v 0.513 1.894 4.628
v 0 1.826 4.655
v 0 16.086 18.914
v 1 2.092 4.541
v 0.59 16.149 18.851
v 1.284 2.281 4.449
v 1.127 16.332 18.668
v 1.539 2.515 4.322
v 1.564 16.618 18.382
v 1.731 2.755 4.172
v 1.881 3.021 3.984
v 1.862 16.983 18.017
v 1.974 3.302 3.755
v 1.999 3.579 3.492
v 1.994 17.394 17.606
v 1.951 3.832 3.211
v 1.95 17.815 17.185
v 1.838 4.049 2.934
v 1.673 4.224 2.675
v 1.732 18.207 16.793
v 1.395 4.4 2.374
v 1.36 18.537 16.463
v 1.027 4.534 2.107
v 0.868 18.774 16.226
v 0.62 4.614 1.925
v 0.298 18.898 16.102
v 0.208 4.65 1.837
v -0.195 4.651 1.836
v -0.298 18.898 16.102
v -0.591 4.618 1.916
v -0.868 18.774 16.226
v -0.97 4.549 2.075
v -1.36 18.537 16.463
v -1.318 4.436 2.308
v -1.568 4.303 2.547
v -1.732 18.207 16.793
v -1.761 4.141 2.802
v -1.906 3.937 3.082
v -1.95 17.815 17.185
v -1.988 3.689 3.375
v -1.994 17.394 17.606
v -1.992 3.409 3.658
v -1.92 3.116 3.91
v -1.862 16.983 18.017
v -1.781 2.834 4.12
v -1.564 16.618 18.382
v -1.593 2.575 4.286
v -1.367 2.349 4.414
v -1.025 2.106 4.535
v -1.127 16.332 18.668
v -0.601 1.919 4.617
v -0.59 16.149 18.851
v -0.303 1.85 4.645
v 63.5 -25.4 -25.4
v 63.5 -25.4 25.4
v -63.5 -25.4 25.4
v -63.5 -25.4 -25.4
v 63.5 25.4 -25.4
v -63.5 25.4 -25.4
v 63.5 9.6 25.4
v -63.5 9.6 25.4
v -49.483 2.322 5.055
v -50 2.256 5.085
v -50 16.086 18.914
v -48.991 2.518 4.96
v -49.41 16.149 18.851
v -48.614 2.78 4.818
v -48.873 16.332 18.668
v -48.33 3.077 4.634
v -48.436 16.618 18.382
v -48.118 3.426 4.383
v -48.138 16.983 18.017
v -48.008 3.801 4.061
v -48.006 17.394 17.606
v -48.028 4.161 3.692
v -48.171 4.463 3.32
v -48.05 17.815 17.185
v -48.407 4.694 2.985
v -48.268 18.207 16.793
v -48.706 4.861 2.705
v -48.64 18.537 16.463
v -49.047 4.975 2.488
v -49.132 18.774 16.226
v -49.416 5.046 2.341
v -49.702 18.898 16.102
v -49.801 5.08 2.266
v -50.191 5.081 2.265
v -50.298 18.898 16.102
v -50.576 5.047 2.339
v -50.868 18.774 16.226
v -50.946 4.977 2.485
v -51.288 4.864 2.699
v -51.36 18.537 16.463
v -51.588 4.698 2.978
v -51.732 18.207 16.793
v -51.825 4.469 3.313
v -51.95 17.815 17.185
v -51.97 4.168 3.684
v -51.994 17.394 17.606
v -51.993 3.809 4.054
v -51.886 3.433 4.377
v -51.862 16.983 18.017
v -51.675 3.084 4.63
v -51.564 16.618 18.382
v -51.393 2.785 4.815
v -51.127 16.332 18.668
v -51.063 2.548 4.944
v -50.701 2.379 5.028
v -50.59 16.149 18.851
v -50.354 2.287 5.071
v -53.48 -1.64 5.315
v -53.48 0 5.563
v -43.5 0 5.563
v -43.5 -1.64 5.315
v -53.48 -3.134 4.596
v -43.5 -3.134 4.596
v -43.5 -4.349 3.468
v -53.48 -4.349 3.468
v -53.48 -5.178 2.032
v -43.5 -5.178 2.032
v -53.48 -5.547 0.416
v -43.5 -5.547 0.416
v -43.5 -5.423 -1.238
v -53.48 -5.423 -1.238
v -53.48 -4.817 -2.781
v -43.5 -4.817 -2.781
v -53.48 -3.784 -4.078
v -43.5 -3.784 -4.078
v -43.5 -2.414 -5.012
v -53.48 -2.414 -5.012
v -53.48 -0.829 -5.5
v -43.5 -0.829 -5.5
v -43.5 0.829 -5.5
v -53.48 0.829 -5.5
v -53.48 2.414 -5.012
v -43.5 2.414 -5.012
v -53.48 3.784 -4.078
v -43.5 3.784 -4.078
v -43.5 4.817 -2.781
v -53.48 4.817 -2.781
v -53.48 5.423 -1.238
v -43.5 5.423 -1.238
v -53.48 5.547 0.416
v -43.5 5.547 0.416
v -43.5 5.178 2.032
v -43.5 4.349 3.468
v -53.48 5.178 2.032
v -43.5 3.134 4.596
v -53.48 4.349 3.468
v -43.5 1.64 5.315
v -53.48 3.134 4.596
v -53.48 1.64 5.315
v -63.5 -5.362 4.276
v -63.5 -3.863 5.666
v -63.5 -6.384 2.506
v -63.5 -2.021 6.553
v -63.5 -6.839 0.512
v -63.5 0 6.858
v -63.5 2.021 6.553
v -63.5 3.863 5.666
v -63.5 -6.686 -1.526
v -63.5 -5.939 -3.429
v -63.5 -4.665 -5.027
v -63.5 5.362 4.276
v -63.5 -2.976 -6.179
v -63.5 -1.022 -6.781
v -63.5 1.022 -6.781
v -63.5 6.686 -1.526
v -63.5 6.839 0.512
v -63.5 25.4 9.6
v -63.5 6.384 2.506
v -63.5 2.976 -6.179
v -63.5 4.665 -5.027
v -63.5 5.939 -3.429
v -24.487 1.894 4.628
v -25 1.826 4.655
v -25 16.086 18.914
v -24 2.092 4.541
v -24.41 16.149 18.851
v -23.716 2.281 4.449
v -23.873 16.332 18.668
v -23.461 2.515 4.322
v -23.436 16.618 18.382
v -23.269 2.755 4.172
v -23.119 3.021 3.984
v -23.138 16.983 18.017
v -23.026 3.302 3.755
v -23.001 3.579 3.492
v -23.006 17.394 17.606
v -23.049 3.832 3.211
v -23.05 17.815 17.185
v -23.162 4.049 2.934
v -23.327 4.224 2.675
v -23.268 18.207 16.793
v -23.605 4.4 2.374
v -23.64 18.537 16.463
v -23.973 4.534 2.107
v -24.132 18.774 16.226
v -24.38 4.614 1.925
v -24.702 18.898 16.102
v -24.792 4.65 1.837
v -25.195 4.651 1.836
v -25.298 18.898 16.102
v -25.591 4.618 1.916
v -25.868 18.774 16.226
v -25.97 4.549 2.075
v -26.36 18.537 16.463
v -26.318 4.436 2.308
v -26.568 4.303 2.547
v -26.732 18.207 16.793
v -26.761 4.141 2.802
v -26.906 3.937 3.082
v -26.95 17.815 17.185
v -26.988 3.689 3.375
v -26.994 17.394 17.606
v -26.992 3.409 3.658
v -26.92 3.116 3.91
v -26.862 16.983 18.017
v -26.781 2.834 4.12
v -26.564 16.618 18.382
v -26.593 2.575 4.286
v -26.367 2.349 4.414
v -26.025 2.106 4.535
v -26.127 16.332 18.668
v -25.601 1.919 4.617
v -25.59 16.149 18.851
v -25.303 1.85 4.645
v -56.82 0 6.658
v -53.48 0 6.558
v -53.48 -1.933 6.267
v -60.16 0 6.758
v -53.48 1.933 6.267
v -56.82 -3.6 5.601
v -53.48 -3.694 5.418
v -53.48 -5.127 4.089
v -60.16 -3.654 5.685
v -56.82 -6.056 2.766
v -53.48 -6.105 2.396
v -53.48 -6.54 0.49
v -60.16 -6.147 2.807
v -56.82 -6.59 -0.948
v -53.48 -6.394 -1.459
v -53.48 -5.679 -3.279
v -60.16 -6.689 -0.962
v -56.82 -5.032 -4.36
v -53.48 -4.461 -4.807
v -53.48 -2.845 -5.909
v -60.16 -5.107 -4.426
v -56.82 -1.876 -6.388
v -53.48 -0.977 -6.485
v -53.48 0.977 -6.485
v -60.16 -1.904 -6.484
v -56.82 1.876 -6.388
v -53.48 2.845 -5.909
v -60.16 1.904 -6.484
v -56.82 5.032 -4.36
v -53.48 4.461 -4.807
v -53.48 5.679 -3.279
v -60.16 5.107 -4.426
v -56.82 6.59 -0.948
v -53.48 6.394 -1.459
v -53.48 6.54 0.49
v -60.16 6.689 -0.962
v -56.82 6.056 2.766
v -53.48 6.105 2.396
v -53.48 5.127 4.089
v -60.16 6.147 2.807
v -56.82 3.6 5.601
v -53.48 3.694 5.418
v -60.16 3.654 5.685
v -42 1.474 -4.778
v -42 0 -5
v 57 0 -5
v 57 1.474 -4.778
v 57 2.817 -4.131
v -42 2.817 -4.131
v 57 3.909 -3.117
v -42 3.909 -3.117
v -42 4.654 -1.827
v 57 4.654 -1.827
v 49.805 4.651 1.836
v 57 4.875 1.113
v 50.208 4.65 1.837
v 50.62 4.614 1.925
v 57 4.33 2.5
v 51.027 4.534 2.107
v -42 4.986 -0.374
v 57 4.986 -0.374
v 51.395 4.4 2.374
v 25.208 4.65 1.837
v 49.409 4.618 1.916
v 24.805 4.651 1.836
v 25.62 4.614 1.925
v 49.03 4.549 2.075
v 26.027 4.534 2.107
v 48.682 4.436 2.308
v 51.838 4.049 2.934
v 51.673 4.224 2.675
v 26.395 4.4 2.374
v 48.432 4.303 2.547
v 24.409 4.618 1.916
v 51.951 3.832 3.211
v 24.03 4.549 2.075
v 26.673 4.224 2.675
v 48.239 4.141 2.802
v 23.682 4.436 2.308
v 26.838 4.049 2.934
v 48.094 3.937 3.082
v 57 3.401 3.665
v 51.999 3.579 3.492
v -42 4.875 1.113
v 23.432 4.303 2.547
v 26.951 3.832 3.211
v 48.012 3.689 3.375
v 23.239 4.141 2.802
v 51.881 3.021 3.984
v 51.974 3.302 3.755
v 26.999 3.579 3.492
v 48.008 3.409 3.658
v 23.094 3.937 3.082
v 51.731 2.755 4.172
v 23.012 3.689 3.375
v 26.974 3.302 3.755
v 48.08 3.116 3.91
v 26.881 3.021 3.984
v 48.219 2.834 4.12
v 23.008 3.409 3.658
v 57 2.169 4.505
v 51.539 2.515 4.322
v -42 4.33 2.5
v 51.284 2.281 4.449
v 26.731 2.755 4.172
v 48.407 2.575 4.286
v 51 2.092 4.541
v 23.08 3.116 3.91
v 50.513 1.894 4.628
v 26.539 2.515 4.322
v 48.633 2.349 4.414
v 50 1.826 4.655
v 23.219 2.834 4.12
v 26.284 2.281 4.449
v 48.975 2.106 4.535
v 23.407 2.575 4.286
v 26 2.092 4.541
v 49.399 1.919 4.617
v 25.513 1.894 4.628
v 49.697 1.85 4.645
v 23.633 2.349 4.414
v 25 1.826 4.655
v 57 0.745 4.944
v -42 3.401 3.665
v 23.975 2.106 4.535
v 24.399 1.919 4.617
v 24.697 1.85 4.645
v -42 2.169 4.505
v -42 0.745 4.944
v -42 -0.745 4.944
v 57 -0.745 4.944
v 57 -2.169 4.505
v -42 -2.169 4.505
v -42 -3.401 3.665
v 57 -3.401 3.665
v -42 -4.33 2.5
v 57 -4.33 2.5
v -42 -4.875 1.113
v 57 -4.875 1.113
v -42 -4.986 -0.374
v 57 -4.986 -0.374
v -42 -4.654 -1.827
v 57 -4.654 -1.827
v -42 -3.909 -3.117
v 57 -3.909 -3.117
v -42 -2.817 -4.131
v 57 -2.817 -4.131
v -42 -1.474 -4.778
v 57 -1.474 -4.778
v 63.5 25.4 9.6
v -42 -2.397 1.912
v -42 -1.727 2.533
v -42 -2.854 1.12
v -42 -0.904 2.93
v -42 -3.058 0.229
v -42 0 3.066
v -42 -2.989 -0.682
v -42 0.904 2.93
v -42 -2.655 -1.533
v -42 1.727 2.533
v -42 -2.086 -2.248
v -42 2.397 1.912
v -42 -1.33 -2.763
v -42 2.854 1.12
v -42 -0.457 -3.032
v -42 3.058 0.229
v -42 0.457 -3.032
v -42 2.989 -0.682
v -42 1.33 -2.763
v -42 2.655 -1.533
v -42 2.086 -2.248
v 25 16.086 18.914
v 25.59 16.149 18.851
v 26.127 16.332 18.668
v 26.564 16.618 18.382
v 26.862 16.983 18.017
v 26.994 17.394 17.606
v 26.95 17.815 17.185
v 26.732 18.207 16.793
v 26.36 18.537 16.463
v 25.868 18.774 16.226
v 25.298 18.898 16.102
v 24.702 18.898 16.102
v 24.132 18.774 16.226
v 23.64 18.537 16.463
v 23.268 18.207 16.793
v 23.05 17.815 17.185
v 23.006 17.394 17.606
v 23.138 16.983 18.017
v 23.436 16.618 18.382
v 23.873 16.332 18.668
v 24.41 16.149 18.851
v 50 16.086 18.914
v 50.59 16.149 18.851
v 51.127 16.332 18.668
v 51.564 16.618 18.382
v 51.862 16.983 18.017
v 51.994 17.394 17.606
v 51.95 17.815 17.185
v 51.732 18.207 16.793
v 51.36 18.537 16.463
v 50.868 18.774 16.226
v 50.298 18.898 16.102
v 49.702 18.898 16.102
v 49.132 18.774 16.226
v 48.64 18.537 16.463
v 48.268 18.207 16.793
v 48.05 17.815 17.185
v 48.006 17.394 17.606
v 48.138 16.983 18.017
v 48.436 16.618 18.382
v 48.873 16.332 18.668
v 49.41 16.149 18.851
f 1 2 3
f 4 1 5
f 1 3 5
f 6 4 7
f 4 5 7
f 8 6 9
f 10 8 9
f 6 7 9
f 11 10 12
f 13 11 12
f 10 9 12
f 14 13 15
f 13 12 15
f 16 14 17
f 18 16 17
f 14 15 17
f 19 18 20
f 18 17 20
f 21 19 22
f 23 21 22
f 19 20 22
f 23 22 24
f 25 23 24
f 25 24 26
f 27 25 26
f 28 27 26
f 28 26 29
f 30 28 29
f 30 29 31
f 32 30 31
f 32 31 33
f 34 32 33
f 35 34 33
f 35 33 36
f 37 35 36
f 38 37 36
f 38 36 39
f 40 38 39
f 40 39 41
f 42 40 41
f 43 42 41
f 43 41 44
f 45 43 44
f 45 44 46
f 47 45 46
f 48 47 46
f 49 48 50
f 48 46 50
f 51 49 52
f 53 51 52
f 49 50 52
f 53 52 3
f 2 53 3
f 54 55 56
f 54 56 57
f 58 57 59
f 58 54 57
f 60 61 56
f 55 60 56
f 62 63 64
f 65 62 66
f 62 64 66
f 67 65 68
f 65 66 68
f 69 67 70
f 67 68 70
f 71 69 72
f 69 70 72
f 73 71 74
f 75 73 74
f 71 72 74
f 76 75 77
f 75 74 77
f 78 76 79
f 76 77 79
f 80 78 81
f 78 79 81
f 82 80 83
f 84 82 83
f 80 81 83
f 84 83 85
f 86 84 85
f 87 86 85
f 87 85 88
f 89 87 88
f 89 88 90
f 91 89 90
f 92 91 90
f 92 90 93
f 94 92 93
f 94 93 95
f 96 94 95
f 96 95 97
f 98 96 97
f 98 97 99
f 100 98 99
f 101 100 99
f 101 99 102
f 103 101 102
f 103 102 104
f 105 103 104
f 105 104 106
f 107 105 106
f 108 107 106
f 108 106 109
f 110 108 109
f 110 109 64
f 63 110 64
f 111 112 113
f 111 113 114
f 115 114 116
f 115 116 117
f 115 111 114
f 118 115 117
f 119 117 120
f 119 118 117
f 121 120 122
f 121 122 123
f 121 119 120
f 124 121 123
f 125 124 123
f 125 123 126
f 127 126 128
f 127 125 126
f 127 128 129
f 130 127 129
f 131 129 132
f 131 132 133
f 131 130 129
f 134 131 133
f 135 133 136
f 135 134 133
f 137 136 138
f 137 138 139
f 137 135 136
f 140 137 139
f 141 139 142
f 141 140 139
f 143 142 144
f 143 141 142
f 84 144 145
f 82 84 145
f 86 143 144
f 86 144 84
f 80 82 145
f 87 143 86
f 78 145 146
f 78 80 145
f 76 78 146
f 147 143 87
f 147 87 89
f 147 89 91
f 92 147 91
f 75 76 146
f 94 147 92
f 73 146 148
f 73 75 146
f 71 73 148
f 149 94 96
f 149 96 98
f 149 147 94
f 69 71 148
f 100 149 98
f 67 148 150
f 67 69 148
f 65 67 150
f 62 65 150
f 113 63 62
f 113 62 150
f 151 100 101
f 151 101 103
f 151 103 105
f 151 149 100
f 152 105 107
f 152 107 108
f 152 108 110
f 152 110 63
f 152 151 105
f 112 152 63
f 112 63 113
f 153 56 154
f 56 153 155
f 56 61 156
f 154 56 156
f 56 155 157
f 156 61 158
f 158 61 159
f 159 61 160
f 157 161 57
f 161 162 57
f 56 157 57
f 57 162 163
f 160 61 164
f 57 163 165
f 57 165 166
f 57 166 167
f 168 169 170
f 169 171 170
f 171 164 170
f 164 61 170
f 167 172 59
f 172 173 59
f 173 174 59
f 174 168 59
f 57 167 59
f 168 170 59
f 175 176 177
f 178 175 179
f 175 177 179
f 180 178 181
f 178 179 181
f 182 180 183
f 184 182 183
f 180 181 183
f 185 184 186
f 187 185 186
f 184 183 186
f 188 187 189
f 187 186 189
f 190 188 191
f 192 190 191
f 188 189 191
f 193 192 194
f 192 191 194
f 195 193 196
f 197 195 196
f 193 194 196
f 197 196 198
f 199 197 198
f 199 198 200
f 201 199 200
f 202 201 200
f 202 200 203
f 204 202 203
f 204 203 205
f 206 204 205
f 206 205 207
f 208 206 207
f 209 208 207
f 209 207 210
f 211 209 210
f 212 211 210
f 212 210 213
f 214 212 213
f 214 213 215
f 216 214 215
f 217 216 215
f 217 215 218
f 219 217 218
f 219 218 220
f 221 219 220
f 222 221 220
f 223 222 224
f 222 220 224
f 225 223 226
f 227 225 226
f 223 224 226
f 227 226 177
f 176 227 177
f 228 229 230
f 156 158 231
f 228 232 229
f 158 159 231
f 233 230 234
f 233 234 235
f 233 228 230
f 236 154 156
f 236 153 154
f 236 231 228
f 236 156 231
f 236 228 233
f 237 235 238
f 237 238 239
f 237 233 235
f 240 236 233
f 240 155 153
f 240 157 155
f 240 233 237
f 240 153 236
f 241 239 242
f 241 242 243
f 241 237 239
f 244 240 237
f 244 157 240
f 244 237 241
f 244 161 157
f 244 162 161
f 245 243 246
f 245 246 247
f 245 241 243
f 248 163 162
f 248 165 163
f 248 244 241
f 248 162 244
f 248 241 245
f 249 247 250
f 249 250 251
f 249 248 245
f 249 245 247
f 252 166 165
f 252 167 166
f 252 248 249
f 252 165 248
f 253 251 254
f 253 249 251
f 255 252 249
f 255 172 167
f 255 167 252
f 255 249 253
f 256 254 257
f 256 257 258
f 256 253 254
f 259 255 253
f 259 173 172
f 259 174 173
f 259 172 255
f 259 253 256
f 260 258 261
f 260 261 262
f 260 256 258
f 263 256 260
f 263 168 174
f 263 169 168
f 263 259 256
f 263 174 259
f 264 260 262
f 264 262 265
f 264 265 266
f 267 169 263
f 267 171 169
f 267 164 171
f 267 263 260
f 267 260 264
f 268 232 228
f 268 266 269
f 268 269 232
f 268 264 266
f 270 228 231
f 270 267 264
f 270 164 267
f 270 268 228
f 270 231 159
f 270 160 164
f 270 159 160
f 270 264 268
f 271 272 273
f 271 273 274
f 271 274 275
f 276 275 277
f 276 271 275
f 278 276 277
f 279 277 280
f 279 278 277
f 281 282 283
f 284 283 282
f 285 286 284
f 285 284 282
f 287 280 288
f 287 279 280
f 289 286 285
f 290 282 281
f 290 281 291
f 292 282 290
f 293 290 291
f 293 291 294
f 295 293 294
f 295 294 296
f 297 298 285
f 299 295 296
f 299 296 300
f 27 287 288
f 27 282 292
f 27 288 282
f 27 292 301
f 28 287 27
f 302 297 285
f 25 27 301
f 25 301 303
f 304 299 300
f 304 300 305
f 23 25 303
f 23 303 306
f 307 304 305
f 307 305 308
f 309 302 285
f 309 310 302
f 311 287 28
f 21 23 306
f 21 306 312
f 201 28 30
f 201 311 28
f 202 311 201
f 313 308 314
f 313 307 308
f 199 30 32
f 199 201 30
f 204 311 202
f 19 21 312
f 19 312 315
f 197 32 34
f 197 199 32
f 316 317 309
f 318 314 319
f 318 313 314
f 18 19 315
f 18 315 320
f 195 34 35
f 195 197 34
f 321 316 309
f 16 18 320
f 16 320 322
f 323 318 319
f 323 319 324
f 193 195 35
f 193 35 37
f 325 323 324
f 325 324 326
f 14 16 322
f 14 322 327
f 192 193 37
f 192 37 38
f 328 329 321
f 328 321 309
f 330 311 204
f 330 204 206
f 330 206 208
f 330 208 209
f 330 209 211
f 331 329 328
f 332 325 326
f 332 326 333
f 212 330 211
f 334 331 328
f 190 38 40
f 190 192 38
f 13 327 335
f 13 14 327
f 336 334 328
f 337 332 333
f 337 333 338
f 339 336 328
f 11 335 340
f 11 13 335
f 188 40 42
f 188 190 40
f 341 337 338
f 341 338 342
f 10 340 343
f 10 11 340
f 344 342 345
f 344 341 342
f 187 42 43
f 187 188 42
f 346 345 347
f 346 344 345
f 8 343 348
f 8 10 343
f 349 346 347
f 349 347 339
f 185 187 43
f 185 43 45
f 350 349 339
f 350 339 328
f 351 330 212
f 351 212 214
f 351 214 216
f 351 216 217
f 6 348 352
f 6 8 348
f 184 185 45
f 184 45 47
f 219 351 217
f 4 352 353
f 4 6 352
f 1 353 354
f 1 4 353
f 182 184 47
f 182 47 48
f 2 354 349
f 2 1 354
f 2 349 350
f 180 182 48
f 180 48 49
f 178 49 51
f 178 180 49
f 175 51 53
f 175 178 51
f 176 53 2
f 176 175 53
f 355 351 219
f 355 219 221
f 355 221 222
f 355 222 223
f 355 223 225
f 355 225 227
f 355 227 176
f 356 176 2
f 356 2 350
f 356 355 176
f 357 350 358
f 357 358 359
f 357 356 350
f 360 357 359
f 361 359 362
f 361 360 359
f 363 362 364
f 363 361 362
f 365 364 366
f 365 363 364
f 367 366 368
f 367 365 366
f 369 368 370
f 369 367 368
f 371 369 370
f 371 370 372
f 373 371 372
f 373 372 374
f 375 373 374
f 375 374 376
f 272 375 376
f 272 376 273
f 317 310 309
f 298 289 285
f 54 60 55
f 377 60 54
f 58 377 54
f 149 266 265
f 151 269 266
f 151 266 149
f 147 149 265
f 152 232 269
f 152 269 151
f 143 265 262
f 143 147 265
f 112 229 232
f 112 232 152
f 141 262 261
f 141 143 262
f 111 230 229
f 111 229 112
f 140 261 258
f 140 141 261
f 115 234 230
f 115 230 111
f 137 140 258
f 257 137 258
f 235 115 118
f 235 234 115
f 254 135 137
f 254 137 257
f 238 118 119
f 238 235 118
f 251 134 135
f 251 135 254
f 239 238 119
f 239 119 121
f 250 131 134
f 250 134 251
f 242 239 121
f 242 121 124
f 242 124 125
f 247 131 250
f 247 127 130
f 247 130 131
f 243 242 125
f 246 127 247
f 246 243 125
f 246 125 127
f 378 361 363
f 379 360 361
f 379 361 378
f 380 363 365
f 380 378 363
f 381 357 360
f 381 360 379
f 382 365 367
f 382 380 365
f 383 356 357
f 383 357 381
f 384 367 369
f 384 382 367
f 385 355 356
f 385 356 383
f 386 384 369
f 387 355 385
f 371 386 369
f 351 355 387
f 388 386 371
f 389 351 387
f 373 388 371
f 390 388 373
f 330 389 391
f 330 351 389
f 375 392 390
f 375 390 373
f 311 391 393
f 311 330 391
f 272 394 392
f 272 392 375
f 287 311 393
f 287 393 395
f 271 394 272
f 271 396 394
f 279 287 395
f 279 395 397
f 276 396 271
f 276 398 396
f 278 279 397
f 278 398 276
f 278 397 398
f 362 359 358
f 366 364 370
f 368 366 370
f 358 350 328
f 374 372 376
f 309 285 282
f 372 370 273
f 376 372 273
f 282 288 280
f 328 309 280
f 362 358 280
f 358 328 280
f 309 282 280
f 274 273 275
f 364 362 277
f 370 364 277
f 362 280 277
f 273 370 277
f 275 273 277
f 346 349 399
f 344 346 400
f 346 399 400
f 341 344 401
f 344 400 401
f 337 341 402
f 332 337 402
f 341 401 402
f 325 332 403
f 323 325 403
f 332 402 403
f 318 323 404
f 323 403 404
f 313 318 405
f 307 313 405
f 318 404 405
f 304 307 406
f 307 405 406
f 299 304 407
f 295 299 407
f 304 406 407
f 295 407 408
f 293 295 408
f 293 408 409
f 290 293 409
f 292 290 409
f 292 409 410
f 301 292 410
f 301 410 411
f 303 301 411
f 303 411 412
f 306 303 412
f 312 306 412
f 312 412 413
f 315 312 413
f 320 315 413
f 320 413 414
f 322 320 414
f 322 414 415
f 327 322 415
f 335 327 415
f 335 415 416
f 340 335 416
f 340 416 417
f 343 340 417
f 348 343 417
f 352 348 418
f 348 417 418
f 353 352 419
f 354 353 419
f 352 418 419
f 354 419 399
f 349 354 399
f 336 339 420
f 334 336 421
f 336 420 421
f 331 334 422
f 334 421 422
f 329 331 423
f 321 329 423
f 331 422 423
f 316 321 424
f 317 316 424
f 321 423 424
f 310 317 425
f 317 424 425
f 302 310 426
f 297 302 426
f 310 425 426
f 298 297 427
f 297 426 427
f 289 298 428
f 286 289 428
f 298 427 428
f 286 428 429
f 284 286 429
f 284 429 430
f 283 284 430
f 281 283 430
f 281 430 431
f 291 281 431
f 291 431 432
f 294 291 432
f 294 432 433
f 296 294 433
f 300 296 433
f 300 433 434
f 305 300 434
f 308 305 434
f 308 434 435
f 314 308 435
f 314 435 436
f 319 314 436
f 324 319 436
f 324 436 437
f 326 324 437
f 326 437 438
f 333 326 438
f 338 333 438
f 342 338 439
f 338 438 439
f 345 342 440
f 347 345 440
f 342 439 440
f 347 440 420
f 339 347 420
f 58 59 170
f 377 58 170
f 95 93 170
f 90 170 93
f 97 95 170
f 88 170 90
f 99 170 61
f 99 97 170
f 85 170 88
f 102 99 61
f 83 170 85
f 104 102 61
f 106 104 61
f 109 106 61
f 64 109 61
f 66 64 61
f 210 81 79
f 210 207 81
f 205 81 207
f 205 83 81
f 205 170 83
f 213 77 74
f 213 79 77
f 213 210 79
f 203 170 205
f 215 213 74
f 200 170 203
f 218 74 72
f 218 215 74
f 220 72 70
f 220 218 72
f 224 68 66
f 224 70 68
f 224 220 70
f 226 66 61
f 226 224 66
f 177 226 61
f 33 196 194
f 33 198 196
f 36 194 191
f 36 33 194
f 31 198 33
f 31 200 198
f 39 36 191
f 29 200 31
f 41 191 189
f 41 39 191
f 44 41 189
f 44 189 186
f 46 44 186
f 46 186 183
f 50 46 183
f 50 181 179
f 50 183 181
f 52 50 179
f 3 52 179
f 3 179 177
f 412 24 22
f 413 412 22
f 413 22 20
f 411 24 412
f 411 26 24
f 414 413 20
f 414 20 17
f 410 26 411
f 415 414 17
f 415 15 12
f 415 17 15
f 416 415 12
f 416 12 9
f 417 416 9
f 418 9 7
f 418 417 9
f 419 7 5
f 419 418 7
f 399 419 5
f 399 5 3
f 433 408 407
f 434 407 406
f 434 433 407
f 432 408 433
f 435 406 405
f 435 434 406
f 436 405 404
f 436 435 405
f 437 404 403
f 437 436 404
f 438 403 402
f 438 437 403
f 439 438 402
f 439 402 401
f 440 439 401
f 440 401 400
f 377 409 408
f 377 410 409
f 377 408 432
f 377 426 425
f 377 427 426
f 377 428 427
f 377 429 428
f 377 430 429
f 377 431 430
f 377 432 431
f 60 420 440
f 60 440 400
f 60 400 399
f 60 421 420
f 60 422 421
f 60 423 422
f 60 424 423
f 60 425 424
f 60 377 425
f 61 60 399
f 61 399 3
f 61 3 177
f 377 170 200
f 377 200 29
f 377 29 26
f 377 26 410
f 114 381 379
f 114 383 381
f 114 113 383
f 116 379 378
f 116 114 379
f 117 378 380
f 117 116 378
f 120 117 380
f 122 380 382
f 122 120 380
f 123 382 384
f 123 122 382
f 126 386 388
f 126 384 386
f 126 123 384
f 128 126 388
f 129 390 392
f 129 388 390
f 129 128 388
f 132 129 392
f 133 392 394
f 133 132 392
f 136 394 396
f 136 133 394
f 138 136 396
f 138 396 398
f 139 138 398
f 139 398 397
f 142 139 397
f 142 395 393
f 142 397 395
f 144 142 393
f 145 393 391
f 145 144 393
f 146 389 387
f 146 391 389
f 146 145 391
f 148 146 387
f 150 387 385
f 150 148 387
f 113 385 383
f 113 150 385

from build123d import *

# Parameters (mm, degrees)
SALIENTE_EXTRUIR1_DEPTH    = 63.5
CORTAR_EXTRUIR1_DEPTH      = 57
CORTAR_EXTRUIR1_DEPTH_BACK = 42
CROQUIS6_R                 = 5
CORTAR_EXTRUIR2_REACH      = 89.824
CORTAR_EXTRUIR2_END_RADIUS = 5
CROQUIS7_R                 = 2


with BuildPart() as part:
    # Croquis1 → Saliente-Extruir1 (new, symmetric)
    with BuildSketch(Plane(origin=(0, 0, 0), x_dir=(0, 0, -1), z_dir=(1, 0, 0))):
        Polygon((-9.6, 25.4), (-25.4, 9.6), (-25.4, -25.4), (25.4, -25.4), (25.4, 25.4), align=None)
    extrude(amount=SALIENTE_EXTRUIR1_DEPTH, both=True)

    # Croquis5 → Taladro roscado 1/4 NPT2 (revolve, cut)
    with BuildSketch(Plane(origin=(-63.5, 0, 0), x_dir=(0, 0, 1), z_dir=(0, 1, 0))):
        Polygon((0, 0), (0, 23.342347279), (5.5626, 20), (5.5626, 10.02), (6.557975082, 10.02), (6.8579873, 0), align=None)
    revolve(axis=Axis((-69.85, 0, 0), (1, 0, 0)), mode=Mode.SUBTRACT)

    # Croquis6 → Cortar-Extruir1 (cut, two sides: drawn at the far end of the back side and taken through both)
    with BuildSketch(Plane(origin=(0, 0, 0), x_dir=(0, 0, -1), z_dir=(1, 0, 0)).offset(-CORTAR_EXTRUIR1_DEPTH_BACK)):
        Circle(CROQUIS6_R)
    extrude(amount=CORTAR_EXTRUIR1_DEPTH + CORTAR_EXTRUIR1_DEPTH_BACK, mode=Mode.SUBTRACT)

    # Cortar-Extruir2: up to this cylinder (the profile starts outside it)
    cortar_extruir2_end = Plane(origin=(0, 0, 0), z_dir=(-1, 0, 0)) * Cylinder(CORTAR_EXTRUIR2_END_RADIUS, 290.648, mode=Mode.PRIVATE)
    # Croquis7 → Cortar-Extruir2 (cut, up to the surface)
    with BuildSketch(Plane(origin=(0, 17.5, 17.5), x_dir=(1, 0, 0), z_dir=(0, 0.7071067811865479, 0.7071067811865472)), mode=Mode.PRIVATE) as cortar_extruir2_sk1:
        with Locations(Location((0, 0, 0), (0, 0, 270))):
            Circle(CROQUIS7_R)
    cortar_extruir2_tool1 = extrude(cortar_extruir2_sk1.sketch, amount=-CORTAR_EXTRUIR2_REACH, mode=Mode.PRIVATE) - cortar_extruir2_end
    add(cortar_extruir2_tool1.solids().sort_by_distance((0, 17.5, 17.5))[0], mode=Mode.SUBTRACT)
    # Croquis7 → Cortar-Extruir2 (cut, up to the surface)
    with BuildSketch(Plane(origin=(0, 17.5, 17.5), x_dir=(1, 0, 0), z_dir=(0, 0.7071067811865479, 0.7071067811865472)), mode=Mode.PRIVATE) as cortar_extruir2_sk2:
        with Locations(Location((25, 0, 0), (0, 0, 270))):
            Circle(CROQUIS7_R)
    cortar_extruir2_tool2 = extrude(cortar_extruir2_sk2.sketch, amount=-CORTAR_EXTRUIR2_REACH, mode=Mode.PRIVATE) - cortar_extruir2_end
    add(cortar_extruir2_tool2.solids().sort_by_distance((25, 17.5, 17.5))[0], mode=Mode.SUBTRACT)
    # Croquis7 → Cortar-Extruir2 (cut, up to the surface)
    with BuildSketch(Plane(origin=(0, 17.5, 17.5), x_dir=(1, 0, 0), z_dir=(0, 0.7071067811865479, 0.7071067811865472)), mode=Mode.PRIVATE) as cortar_extruir2_sk3:
        with Locations(Location((50, 0, 0), (0, 0, 270))):
            Circle(CROQUIS7_R)
    cortar_extruir2_tool3 = extrude(cortar_extruir2_sk3.sketch, amount=-CORTAR_EXTRUIR2_REACH, mode=Mode.PRIVATE) - cortar_extruir2_end
    add(cortar_extruir2_tool3.solids().sort_by_distance((50, 17.5, 17.5))[0], mode=Mode.SUBTRACT)
    # Croquis7 → Cortar-Extruir2 (cut, up to the surface)
    with BuildSketch(Plane(origin=(0, 17.5, 17.5), x_dir=(1, 0, 0), z_dir=(0, 0.7071067811865479, 0.7071067811865472)), mode=Mode.PRIVATE) as cortar_extruir2_sk4:
        with Locations(Location((-50, 0, 0), (0, 0, 270))):
            Circle(CROQUIS7_R)
    cortar_extruir2_tool4 = extrude(cortar_extruir2_sk4.sketch, amount=-CORTAR_EXTRUIR2_REACH, mode=Mode.PRIVATE) - cortar_extruir2_end
    add(cortar_extruir2_tool4.solids().sort_by_distance((-50, 17.5, 17.5))[0], mode=Mode.SUBTRACT)
    # Croquis7 → Cortar-Extruir2 (cut, up to the surface)
    with BuildSketch(Plane(origin=(0, 17.5, 17.5), x_dir=(1, 0, 0), z_dir=(0, 0.7071067811865479, 0.7071067811865472)), mode=Mode.PRIVATE) as cortar_extruir2_sk5:
        with Locations(Location((-25, 0, 0), (0, 0, 270))):
            Circle(CROQUIS7_R)
    cortar_extruir2_tool5 = extrude(cortar_extruir2_sk5.sketch, amount=-CORTAR_EXTRUIR2_REACH, mode=Mode.PRIVATE) - cortar_extruir2_end
    add(cortar_extruir2_tool5.solids().sort_by_distance((-25, 17.5, 17.5))[0], mode=Mode.SUBTRACT)


solid = part.part
